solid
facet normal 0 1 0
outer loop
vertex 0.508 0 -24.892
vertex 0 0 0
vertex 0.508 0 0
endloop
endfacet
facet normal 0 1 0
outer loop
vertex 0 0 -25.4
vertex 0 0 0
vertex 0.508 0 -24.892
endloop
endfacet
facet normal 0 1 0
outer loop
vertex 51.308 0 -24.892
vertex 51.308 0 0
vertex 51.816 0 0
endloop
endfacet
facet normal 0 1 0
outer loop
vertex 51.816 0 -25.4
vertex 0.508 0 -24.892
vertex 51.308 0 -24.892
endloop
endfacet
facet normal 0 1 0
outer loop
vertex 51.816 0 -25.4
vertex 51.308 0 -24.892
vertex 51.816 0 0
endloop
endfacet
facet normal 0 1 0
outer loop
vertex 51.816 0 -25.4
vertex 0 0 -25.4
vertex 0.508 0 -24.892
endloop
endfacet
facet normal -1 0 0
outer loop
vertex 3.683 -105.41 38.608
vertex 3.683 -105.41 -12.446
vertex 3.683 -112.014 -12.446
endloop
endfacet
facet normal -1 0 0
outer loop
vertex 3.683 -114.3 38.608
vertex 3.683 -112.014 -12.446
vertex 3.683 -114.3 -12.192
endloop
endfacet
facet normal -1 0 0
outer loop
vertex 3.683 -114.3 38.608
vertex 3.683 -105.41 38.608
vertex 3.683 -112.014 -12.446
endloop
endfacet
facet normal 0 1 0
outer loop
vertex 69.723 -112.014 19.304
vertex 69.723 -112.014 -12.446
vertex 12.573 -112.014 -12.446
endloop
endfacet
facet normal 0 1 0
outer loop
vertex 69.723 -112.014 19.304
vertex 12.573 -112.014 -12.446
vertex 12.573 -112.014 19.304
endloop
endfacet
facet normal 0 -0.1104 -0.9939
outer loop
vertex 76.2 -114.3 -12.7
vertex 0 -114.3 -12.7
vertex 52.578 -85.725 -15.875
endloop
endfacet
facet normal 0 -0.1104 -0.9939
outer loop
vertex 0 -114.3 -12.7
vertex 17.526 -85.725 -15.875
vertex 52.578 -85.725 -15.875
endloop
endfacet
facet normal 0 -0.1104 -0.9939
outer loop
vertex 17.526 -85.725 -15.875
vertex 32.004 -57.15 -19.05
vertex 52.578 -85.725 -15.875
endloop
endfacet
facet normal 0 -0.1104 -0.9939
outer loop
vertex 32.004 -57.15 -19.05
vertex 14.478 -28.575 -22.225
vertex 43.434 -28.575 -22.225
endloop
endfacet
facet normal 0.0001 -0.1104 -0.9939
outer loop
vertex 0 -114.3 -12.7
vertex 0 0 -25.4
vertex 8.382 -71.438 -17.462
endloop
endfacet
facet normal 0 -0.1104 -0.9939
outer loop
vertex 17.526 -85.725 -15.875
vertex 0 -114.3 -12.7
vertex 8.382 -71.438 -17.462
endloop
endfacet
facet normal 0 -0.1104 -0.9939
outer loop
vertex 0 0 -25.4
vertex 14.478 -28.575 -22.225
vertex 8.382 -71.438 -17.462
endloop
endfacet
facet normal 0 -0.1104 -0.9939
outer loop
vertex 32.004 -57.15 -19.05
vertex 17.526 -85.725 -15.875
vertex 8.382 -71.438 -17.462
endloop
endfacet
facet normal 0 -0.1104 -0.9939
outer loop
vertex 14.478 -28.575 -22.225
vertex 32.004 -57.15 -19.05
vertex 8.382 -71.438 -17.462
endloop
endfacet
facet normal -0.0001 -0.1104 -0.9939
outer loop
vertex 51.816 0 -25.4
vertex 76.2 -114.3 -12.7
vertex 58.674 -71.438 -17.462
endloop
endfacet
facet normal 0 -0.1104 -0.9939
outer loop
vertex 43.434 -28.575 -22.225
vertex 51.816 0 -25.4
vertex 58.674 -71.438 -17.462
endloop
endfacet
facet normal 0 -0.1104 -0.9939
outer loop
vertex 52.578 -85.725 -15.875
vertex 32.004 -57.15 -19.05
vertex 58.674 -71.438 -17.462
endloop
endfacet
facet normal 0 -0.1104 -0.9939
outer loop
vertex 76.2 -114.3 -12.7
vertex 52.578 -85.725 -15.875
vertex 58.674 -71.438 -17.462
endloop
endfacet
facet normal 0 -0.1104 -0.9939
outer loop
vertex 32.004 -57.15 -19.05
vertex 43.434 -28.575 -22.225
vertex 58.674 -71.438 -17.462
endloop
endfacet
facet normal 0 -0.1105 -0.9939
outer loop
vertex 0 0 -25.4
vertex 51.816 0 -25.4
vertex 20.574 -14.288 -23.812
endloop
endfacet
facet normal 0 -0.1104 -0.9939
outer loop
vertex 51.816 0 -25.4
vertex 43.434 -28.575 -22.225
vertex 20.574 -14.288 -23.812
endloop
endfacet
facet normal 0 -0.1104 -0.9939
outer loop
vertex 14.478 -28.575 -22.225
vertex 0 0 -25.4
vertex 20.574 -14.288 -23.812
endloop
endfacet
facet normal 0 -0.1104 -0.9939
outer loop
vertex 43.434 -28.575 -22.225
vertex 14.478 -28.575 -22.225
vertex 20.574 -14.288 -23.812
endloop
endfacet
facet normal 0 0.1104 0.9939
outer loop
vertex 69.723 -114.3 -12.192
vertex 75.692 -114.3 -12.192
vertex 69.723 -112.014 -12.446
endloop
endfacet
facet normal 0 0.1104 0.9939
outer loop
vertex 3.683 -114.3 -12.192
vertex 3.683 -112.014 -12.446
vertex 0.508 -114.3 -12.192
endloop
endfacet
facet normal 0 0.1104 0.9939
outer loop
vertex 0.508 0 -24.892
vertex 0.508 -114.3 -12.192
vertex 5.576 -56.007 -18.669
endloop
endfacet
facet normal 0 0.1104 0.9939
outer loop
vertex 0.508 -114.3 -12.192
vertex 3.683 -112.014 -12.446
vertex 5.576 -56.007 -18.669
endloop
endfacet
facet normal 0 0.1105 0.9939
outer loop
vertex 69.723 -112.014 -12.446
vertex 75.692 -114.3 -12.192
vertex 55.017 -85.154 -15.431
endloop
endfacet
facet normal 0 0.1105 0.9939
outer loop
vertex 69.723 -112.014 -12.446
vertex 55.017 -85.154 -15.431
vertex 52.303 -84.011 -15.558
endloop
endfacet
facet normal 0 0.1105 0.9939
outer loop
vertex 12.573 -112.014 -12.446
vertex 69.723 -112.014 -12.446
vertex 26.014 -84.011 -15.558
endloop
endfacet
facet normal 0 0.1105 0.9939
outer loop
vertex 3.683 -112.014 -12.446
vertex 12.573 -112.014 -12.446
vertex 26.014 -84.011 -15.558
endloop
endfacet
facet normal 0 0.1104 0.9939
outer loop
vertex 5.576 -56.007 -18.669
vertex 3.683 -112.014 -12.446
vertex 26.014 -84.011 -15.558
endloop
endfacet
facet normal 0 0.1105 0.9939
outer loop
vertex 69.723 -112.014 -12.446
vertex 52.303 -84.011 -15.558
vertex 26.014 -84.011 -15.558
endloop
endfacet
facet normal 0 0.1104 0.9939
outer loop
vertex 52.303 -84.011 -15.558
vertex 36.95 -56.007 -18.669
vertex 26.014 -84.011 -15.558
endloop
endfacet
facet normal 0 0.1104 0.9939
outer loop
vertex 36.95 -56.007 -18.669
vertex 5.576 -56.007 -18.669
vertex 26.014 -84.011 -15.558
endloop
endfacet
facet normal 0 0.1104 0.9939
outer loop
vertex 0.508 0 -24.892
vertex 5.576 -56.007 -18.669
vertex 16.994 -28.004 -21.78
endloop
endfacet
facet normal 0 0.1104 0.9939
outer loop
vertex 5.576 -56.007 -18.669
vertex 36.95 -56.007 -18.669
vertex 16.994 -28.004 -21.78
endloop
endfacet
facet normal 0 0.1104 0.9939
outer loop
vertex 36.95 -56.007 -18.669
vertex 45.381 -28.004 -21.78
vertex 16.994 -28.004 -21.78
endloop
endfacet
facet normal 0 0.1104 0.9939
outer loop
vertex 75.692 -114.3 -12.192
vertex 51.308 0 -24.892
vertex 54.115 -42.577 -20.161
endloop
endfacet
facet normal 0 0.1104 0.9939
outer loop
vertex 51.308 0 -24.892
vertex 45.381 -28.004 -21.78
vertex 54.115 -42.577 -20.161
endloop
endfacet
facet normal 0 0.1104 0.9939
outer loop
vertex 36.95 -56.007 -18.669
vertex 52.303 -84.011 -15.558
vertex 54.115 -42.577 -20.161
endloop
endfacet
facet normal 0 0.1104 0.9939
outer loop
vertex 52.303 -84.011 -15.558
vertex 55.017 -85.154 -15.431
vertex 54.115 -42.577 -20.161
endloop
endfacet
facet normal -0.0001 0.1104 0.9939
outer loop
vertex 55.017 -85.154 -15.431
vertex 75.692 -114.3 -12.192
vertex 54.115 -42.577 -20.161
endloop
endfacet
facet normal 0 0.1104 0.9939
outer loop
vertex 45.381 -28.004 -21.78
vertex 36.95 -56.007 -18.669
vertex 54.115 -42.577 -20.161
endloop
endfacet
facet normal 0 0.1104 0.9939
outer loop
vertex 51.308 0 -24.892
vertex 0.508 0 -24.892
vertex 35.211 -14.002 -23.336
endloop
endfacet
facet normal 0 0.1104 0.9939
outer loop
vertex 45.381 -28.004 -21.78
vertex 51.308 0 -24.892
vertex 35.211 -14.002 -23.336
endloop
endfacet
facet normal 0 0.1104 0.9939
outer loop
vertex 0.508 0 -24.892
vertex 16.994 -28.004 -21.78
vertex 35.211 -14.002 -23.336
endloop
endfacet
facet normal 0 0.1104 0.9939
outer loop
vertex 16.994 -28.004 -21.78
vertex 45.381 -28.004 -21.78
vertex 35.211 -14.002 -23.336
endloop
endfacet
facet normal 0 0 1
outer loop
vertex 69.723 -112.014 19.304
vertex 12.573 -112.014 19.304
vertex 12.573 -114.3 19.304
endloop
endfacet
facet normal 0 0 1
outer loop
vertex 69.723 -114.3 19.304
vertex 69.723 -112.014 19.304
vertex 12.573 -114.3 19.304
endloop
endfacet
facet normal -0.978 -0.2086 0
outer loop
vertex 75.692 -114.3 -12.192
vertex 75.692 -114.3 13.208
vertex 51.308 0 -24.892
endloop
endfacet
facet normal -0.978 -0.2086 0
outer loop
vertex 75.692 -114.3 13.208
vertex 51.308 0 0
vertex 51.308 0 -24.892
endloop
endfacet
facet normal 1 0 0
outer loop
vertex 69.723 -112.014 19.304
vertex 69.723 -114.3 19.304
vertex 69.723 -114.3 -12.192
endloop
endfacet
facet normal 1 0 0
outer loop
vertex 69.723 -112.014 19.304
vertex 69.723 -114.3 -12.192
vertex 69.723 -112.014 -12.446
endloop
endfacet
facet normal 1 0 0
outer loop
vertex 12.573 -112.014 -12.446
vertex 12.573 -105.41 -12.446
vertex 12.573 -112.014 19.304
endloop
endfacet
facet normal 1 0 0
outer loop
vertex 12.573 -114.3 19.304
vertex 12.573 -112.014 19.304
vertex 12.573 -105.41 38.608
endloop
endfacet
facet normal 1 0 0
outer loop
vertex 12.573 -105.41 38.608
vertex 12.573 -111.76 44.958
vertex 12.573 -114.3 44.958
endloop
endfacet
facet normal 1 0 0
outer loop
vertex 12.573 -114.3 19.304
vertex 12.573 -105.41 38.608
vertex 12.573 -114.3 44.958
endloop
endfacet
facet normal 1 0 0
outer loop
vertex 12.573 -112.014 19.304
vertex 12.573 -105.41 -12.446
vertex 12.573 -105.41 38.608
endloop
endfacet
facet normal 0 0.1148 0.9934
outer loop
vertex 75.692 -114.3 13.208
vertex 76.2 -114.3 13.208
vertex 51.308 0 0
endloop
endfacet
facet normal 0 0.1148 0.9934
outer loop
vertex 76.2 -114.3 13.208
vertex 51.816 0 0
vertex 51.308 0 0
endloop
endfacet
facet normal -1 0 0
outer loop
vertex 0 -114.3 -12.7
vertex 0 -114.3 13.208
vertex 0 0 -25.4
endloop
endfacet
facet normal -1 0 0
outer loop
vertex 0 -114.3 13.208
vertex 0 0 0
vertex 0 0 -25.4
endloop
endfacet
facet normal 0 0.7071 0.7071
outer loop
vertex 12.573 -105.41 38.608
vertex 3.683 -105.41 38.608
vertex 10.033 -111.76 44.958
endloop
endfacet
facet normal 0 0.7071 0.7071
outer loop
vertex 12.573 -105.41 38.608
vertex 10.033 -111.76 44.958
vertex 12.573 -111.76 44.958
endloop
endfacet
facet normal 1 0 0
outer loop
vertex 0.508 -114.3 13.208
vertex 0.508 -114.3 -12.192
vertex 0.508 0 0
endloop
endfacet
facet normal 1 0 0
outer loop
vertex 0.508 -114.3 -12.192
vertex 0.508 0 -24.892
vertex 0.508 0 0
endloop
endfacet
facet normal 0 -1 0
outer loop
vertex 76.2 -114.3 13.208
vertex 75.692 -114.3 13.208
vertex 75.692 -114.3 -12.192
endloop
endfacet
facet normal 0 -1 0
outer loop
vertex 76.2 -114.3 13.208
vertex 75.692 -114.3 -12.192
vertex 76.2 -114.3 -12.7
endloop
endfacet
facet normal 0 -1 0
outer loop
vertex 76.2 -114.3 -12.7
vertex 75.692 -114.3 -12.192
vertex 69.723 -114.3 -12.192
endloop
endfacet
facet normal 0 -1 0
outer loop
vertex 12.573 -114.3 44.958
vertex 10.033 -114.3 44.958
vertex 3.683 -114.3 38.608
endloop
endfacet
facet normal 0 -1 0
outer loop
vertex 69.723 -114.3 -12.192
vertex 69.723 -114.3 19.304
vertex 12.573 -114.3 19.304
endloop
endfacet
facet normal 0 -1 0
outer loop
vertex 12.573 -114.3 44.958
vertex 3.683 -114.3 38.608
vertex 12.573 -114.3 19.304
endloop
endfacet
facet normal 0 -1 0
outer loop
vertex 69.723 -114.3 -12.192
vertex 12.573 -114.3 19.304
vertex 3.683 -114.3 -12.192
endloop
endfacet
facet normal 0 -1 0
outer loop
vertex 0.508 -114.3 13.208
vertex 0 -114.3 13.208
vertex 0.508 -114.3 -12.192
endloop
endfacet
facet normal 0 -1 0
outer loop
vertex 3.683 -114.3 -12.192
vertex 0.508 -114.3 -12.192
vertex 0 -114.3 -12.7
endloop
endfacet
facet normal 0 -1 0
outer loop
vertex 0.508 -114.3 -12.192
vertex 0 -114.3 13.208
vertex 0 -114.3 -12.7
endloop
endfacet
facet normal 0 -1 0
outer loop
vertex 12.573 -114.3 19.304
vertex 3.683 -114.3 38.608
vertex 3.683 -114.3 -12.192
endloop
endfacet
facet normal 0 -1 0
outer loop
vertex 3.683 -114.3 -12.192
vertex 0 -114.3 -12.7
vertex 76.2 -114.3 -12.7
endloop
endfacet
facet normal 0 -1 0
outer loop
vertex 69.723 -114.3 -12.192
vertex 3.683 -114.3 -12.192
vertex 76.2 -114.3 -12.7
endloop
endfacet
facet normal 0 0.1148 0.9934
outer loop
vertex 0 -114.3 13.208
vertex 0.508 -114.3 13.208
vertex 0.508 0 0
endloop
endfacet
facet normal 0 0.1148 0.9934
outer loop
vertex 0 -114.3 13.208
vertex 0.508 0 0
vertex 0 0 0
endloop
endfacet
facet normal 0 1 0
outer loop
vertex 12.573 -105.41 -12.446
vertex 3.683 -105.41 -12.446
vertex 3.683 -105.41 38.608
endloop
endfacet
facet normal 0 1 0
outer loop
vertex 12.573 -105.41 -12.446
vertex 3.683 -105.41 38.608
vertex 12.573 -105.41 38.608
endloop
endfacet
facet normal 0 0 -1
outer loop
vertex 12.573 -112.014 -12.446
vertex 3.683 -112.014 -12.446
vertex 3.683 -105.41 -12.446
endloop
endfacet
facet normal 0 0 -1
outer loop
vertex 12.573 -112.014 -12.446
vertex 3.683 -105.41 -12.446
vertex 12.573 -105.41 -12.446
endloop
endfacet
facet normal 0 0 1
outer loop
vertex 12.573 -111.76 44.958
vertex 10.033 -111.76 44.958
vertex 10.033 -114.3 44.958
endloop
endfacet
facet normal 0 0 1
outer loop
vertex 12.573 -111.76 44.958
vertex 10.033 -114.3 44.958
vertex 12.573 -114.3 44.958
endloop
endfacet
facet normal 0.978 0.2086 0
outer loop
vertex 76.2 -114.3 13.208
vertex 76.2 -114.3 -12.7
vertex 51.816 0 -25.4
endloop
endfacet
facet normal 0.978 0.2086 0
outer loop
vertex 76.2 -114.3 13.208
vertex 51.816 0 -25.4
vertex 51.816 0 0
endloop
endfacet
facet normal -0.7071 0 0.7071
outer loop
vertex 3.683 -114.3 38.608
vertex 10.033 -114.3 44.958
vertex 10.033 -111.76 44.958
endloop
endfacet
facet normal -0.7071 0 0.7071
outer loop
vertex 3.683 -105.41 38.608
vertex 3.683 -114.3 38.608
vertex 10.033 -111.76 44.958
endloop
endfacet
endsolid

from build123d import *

# Parameters (mm, degrees)
F5_W      = 8.89
F5_H      = 8.89
F6_DEPTH  = 57.15
F6_FACE_W = 8.89
F6_FACE_H = 8.89
F7_DEPTH  = 0.254
F9_DEPTH  = 57.15
F10_SIZE  = 6.35
F11_SIZE  = 6.35


with BuildPart() as f3:
    # F2 (on offset) → F3 section 0
    with BuildSketch(Plane.XZ.offset(114.3)):
        Polygon((0.508, 13.208), (0, 13.208), (0, -12.192), (0, -12.7), (76.2, -12.7), (76.2, -12.192), (76.2, 13.208), (75.692, 13.208), (75.692, -12.192), (0.508, -12.192), align=None)
    # F0 (on Front) → F3 section 1
    with BuildSketch(Plane.XZ):
        Polygon((0.508, 0), (0, 0), (0, -24.892), (0, -25.4), (51.816, -25.4), (51.816, -24.892), (51.816, 0), (51.308, 0), (51.308, -24.892), (0.508, -24.892), align=None)
    loft()

    # F5 (on face) → F6 (join)
    with BuildSketch(Plane.XY.offset(-12.192)):
        with Locations((8.128, -109.855)):
            Rectangle(F5_W, F5_H)
    extrude(amount=F6_DEPTH)

    # F6_face (on face) → F7 (join)
    with BuildSketch(Plane(origin=(8.128, -109.855, -12.192), x_dir=(1, 0, 0), z_dir=(0, 0, -1))):
        Rectangle(F6_FACE_W, F6_FACE_H)
    extrude(amount=F7_DEPTH)

    # F8 (on face) → F9 (join)
    with BuildSketch(Plane.YZ.offset(12.573)):
        with BuildLine():
            Line((-112.014, 19.304), (-114.3, 19.304))
            Line((-114.3, 19.304), (-114.3, -12.192))
            add(Edge.make_bspline(
                [(-114.3, -12.192), (-113.728496, -12.2555), (-113.156994, -12.319001), (-112.585496, -12.3825), (-112.014, -12.446)],
                knots=[0, 0, 0, 0, 0, 1, 1, 1, 1, 1], degree=4))
            Line((-112.014, -12.446), (-112.014, 19.304))
        make_face()
    extrude(amount=F9_DEPTH)

    # F10
    f10_edges = [f3.edges().sort_by_distance(p)[0] for p in [
        (3.683, -109.855, 44.958),
    ]]
    chamfer(f10_edges, length=F10_SIZE)

    # F11
    f11_edges = [f3.edges().sort_by_distance(p)[0] for p in [
        (11.303, -105.41, 44.958),
    ]]
    chamfer(f11_edges, length=F11_SIZE)


solid = f3.part
